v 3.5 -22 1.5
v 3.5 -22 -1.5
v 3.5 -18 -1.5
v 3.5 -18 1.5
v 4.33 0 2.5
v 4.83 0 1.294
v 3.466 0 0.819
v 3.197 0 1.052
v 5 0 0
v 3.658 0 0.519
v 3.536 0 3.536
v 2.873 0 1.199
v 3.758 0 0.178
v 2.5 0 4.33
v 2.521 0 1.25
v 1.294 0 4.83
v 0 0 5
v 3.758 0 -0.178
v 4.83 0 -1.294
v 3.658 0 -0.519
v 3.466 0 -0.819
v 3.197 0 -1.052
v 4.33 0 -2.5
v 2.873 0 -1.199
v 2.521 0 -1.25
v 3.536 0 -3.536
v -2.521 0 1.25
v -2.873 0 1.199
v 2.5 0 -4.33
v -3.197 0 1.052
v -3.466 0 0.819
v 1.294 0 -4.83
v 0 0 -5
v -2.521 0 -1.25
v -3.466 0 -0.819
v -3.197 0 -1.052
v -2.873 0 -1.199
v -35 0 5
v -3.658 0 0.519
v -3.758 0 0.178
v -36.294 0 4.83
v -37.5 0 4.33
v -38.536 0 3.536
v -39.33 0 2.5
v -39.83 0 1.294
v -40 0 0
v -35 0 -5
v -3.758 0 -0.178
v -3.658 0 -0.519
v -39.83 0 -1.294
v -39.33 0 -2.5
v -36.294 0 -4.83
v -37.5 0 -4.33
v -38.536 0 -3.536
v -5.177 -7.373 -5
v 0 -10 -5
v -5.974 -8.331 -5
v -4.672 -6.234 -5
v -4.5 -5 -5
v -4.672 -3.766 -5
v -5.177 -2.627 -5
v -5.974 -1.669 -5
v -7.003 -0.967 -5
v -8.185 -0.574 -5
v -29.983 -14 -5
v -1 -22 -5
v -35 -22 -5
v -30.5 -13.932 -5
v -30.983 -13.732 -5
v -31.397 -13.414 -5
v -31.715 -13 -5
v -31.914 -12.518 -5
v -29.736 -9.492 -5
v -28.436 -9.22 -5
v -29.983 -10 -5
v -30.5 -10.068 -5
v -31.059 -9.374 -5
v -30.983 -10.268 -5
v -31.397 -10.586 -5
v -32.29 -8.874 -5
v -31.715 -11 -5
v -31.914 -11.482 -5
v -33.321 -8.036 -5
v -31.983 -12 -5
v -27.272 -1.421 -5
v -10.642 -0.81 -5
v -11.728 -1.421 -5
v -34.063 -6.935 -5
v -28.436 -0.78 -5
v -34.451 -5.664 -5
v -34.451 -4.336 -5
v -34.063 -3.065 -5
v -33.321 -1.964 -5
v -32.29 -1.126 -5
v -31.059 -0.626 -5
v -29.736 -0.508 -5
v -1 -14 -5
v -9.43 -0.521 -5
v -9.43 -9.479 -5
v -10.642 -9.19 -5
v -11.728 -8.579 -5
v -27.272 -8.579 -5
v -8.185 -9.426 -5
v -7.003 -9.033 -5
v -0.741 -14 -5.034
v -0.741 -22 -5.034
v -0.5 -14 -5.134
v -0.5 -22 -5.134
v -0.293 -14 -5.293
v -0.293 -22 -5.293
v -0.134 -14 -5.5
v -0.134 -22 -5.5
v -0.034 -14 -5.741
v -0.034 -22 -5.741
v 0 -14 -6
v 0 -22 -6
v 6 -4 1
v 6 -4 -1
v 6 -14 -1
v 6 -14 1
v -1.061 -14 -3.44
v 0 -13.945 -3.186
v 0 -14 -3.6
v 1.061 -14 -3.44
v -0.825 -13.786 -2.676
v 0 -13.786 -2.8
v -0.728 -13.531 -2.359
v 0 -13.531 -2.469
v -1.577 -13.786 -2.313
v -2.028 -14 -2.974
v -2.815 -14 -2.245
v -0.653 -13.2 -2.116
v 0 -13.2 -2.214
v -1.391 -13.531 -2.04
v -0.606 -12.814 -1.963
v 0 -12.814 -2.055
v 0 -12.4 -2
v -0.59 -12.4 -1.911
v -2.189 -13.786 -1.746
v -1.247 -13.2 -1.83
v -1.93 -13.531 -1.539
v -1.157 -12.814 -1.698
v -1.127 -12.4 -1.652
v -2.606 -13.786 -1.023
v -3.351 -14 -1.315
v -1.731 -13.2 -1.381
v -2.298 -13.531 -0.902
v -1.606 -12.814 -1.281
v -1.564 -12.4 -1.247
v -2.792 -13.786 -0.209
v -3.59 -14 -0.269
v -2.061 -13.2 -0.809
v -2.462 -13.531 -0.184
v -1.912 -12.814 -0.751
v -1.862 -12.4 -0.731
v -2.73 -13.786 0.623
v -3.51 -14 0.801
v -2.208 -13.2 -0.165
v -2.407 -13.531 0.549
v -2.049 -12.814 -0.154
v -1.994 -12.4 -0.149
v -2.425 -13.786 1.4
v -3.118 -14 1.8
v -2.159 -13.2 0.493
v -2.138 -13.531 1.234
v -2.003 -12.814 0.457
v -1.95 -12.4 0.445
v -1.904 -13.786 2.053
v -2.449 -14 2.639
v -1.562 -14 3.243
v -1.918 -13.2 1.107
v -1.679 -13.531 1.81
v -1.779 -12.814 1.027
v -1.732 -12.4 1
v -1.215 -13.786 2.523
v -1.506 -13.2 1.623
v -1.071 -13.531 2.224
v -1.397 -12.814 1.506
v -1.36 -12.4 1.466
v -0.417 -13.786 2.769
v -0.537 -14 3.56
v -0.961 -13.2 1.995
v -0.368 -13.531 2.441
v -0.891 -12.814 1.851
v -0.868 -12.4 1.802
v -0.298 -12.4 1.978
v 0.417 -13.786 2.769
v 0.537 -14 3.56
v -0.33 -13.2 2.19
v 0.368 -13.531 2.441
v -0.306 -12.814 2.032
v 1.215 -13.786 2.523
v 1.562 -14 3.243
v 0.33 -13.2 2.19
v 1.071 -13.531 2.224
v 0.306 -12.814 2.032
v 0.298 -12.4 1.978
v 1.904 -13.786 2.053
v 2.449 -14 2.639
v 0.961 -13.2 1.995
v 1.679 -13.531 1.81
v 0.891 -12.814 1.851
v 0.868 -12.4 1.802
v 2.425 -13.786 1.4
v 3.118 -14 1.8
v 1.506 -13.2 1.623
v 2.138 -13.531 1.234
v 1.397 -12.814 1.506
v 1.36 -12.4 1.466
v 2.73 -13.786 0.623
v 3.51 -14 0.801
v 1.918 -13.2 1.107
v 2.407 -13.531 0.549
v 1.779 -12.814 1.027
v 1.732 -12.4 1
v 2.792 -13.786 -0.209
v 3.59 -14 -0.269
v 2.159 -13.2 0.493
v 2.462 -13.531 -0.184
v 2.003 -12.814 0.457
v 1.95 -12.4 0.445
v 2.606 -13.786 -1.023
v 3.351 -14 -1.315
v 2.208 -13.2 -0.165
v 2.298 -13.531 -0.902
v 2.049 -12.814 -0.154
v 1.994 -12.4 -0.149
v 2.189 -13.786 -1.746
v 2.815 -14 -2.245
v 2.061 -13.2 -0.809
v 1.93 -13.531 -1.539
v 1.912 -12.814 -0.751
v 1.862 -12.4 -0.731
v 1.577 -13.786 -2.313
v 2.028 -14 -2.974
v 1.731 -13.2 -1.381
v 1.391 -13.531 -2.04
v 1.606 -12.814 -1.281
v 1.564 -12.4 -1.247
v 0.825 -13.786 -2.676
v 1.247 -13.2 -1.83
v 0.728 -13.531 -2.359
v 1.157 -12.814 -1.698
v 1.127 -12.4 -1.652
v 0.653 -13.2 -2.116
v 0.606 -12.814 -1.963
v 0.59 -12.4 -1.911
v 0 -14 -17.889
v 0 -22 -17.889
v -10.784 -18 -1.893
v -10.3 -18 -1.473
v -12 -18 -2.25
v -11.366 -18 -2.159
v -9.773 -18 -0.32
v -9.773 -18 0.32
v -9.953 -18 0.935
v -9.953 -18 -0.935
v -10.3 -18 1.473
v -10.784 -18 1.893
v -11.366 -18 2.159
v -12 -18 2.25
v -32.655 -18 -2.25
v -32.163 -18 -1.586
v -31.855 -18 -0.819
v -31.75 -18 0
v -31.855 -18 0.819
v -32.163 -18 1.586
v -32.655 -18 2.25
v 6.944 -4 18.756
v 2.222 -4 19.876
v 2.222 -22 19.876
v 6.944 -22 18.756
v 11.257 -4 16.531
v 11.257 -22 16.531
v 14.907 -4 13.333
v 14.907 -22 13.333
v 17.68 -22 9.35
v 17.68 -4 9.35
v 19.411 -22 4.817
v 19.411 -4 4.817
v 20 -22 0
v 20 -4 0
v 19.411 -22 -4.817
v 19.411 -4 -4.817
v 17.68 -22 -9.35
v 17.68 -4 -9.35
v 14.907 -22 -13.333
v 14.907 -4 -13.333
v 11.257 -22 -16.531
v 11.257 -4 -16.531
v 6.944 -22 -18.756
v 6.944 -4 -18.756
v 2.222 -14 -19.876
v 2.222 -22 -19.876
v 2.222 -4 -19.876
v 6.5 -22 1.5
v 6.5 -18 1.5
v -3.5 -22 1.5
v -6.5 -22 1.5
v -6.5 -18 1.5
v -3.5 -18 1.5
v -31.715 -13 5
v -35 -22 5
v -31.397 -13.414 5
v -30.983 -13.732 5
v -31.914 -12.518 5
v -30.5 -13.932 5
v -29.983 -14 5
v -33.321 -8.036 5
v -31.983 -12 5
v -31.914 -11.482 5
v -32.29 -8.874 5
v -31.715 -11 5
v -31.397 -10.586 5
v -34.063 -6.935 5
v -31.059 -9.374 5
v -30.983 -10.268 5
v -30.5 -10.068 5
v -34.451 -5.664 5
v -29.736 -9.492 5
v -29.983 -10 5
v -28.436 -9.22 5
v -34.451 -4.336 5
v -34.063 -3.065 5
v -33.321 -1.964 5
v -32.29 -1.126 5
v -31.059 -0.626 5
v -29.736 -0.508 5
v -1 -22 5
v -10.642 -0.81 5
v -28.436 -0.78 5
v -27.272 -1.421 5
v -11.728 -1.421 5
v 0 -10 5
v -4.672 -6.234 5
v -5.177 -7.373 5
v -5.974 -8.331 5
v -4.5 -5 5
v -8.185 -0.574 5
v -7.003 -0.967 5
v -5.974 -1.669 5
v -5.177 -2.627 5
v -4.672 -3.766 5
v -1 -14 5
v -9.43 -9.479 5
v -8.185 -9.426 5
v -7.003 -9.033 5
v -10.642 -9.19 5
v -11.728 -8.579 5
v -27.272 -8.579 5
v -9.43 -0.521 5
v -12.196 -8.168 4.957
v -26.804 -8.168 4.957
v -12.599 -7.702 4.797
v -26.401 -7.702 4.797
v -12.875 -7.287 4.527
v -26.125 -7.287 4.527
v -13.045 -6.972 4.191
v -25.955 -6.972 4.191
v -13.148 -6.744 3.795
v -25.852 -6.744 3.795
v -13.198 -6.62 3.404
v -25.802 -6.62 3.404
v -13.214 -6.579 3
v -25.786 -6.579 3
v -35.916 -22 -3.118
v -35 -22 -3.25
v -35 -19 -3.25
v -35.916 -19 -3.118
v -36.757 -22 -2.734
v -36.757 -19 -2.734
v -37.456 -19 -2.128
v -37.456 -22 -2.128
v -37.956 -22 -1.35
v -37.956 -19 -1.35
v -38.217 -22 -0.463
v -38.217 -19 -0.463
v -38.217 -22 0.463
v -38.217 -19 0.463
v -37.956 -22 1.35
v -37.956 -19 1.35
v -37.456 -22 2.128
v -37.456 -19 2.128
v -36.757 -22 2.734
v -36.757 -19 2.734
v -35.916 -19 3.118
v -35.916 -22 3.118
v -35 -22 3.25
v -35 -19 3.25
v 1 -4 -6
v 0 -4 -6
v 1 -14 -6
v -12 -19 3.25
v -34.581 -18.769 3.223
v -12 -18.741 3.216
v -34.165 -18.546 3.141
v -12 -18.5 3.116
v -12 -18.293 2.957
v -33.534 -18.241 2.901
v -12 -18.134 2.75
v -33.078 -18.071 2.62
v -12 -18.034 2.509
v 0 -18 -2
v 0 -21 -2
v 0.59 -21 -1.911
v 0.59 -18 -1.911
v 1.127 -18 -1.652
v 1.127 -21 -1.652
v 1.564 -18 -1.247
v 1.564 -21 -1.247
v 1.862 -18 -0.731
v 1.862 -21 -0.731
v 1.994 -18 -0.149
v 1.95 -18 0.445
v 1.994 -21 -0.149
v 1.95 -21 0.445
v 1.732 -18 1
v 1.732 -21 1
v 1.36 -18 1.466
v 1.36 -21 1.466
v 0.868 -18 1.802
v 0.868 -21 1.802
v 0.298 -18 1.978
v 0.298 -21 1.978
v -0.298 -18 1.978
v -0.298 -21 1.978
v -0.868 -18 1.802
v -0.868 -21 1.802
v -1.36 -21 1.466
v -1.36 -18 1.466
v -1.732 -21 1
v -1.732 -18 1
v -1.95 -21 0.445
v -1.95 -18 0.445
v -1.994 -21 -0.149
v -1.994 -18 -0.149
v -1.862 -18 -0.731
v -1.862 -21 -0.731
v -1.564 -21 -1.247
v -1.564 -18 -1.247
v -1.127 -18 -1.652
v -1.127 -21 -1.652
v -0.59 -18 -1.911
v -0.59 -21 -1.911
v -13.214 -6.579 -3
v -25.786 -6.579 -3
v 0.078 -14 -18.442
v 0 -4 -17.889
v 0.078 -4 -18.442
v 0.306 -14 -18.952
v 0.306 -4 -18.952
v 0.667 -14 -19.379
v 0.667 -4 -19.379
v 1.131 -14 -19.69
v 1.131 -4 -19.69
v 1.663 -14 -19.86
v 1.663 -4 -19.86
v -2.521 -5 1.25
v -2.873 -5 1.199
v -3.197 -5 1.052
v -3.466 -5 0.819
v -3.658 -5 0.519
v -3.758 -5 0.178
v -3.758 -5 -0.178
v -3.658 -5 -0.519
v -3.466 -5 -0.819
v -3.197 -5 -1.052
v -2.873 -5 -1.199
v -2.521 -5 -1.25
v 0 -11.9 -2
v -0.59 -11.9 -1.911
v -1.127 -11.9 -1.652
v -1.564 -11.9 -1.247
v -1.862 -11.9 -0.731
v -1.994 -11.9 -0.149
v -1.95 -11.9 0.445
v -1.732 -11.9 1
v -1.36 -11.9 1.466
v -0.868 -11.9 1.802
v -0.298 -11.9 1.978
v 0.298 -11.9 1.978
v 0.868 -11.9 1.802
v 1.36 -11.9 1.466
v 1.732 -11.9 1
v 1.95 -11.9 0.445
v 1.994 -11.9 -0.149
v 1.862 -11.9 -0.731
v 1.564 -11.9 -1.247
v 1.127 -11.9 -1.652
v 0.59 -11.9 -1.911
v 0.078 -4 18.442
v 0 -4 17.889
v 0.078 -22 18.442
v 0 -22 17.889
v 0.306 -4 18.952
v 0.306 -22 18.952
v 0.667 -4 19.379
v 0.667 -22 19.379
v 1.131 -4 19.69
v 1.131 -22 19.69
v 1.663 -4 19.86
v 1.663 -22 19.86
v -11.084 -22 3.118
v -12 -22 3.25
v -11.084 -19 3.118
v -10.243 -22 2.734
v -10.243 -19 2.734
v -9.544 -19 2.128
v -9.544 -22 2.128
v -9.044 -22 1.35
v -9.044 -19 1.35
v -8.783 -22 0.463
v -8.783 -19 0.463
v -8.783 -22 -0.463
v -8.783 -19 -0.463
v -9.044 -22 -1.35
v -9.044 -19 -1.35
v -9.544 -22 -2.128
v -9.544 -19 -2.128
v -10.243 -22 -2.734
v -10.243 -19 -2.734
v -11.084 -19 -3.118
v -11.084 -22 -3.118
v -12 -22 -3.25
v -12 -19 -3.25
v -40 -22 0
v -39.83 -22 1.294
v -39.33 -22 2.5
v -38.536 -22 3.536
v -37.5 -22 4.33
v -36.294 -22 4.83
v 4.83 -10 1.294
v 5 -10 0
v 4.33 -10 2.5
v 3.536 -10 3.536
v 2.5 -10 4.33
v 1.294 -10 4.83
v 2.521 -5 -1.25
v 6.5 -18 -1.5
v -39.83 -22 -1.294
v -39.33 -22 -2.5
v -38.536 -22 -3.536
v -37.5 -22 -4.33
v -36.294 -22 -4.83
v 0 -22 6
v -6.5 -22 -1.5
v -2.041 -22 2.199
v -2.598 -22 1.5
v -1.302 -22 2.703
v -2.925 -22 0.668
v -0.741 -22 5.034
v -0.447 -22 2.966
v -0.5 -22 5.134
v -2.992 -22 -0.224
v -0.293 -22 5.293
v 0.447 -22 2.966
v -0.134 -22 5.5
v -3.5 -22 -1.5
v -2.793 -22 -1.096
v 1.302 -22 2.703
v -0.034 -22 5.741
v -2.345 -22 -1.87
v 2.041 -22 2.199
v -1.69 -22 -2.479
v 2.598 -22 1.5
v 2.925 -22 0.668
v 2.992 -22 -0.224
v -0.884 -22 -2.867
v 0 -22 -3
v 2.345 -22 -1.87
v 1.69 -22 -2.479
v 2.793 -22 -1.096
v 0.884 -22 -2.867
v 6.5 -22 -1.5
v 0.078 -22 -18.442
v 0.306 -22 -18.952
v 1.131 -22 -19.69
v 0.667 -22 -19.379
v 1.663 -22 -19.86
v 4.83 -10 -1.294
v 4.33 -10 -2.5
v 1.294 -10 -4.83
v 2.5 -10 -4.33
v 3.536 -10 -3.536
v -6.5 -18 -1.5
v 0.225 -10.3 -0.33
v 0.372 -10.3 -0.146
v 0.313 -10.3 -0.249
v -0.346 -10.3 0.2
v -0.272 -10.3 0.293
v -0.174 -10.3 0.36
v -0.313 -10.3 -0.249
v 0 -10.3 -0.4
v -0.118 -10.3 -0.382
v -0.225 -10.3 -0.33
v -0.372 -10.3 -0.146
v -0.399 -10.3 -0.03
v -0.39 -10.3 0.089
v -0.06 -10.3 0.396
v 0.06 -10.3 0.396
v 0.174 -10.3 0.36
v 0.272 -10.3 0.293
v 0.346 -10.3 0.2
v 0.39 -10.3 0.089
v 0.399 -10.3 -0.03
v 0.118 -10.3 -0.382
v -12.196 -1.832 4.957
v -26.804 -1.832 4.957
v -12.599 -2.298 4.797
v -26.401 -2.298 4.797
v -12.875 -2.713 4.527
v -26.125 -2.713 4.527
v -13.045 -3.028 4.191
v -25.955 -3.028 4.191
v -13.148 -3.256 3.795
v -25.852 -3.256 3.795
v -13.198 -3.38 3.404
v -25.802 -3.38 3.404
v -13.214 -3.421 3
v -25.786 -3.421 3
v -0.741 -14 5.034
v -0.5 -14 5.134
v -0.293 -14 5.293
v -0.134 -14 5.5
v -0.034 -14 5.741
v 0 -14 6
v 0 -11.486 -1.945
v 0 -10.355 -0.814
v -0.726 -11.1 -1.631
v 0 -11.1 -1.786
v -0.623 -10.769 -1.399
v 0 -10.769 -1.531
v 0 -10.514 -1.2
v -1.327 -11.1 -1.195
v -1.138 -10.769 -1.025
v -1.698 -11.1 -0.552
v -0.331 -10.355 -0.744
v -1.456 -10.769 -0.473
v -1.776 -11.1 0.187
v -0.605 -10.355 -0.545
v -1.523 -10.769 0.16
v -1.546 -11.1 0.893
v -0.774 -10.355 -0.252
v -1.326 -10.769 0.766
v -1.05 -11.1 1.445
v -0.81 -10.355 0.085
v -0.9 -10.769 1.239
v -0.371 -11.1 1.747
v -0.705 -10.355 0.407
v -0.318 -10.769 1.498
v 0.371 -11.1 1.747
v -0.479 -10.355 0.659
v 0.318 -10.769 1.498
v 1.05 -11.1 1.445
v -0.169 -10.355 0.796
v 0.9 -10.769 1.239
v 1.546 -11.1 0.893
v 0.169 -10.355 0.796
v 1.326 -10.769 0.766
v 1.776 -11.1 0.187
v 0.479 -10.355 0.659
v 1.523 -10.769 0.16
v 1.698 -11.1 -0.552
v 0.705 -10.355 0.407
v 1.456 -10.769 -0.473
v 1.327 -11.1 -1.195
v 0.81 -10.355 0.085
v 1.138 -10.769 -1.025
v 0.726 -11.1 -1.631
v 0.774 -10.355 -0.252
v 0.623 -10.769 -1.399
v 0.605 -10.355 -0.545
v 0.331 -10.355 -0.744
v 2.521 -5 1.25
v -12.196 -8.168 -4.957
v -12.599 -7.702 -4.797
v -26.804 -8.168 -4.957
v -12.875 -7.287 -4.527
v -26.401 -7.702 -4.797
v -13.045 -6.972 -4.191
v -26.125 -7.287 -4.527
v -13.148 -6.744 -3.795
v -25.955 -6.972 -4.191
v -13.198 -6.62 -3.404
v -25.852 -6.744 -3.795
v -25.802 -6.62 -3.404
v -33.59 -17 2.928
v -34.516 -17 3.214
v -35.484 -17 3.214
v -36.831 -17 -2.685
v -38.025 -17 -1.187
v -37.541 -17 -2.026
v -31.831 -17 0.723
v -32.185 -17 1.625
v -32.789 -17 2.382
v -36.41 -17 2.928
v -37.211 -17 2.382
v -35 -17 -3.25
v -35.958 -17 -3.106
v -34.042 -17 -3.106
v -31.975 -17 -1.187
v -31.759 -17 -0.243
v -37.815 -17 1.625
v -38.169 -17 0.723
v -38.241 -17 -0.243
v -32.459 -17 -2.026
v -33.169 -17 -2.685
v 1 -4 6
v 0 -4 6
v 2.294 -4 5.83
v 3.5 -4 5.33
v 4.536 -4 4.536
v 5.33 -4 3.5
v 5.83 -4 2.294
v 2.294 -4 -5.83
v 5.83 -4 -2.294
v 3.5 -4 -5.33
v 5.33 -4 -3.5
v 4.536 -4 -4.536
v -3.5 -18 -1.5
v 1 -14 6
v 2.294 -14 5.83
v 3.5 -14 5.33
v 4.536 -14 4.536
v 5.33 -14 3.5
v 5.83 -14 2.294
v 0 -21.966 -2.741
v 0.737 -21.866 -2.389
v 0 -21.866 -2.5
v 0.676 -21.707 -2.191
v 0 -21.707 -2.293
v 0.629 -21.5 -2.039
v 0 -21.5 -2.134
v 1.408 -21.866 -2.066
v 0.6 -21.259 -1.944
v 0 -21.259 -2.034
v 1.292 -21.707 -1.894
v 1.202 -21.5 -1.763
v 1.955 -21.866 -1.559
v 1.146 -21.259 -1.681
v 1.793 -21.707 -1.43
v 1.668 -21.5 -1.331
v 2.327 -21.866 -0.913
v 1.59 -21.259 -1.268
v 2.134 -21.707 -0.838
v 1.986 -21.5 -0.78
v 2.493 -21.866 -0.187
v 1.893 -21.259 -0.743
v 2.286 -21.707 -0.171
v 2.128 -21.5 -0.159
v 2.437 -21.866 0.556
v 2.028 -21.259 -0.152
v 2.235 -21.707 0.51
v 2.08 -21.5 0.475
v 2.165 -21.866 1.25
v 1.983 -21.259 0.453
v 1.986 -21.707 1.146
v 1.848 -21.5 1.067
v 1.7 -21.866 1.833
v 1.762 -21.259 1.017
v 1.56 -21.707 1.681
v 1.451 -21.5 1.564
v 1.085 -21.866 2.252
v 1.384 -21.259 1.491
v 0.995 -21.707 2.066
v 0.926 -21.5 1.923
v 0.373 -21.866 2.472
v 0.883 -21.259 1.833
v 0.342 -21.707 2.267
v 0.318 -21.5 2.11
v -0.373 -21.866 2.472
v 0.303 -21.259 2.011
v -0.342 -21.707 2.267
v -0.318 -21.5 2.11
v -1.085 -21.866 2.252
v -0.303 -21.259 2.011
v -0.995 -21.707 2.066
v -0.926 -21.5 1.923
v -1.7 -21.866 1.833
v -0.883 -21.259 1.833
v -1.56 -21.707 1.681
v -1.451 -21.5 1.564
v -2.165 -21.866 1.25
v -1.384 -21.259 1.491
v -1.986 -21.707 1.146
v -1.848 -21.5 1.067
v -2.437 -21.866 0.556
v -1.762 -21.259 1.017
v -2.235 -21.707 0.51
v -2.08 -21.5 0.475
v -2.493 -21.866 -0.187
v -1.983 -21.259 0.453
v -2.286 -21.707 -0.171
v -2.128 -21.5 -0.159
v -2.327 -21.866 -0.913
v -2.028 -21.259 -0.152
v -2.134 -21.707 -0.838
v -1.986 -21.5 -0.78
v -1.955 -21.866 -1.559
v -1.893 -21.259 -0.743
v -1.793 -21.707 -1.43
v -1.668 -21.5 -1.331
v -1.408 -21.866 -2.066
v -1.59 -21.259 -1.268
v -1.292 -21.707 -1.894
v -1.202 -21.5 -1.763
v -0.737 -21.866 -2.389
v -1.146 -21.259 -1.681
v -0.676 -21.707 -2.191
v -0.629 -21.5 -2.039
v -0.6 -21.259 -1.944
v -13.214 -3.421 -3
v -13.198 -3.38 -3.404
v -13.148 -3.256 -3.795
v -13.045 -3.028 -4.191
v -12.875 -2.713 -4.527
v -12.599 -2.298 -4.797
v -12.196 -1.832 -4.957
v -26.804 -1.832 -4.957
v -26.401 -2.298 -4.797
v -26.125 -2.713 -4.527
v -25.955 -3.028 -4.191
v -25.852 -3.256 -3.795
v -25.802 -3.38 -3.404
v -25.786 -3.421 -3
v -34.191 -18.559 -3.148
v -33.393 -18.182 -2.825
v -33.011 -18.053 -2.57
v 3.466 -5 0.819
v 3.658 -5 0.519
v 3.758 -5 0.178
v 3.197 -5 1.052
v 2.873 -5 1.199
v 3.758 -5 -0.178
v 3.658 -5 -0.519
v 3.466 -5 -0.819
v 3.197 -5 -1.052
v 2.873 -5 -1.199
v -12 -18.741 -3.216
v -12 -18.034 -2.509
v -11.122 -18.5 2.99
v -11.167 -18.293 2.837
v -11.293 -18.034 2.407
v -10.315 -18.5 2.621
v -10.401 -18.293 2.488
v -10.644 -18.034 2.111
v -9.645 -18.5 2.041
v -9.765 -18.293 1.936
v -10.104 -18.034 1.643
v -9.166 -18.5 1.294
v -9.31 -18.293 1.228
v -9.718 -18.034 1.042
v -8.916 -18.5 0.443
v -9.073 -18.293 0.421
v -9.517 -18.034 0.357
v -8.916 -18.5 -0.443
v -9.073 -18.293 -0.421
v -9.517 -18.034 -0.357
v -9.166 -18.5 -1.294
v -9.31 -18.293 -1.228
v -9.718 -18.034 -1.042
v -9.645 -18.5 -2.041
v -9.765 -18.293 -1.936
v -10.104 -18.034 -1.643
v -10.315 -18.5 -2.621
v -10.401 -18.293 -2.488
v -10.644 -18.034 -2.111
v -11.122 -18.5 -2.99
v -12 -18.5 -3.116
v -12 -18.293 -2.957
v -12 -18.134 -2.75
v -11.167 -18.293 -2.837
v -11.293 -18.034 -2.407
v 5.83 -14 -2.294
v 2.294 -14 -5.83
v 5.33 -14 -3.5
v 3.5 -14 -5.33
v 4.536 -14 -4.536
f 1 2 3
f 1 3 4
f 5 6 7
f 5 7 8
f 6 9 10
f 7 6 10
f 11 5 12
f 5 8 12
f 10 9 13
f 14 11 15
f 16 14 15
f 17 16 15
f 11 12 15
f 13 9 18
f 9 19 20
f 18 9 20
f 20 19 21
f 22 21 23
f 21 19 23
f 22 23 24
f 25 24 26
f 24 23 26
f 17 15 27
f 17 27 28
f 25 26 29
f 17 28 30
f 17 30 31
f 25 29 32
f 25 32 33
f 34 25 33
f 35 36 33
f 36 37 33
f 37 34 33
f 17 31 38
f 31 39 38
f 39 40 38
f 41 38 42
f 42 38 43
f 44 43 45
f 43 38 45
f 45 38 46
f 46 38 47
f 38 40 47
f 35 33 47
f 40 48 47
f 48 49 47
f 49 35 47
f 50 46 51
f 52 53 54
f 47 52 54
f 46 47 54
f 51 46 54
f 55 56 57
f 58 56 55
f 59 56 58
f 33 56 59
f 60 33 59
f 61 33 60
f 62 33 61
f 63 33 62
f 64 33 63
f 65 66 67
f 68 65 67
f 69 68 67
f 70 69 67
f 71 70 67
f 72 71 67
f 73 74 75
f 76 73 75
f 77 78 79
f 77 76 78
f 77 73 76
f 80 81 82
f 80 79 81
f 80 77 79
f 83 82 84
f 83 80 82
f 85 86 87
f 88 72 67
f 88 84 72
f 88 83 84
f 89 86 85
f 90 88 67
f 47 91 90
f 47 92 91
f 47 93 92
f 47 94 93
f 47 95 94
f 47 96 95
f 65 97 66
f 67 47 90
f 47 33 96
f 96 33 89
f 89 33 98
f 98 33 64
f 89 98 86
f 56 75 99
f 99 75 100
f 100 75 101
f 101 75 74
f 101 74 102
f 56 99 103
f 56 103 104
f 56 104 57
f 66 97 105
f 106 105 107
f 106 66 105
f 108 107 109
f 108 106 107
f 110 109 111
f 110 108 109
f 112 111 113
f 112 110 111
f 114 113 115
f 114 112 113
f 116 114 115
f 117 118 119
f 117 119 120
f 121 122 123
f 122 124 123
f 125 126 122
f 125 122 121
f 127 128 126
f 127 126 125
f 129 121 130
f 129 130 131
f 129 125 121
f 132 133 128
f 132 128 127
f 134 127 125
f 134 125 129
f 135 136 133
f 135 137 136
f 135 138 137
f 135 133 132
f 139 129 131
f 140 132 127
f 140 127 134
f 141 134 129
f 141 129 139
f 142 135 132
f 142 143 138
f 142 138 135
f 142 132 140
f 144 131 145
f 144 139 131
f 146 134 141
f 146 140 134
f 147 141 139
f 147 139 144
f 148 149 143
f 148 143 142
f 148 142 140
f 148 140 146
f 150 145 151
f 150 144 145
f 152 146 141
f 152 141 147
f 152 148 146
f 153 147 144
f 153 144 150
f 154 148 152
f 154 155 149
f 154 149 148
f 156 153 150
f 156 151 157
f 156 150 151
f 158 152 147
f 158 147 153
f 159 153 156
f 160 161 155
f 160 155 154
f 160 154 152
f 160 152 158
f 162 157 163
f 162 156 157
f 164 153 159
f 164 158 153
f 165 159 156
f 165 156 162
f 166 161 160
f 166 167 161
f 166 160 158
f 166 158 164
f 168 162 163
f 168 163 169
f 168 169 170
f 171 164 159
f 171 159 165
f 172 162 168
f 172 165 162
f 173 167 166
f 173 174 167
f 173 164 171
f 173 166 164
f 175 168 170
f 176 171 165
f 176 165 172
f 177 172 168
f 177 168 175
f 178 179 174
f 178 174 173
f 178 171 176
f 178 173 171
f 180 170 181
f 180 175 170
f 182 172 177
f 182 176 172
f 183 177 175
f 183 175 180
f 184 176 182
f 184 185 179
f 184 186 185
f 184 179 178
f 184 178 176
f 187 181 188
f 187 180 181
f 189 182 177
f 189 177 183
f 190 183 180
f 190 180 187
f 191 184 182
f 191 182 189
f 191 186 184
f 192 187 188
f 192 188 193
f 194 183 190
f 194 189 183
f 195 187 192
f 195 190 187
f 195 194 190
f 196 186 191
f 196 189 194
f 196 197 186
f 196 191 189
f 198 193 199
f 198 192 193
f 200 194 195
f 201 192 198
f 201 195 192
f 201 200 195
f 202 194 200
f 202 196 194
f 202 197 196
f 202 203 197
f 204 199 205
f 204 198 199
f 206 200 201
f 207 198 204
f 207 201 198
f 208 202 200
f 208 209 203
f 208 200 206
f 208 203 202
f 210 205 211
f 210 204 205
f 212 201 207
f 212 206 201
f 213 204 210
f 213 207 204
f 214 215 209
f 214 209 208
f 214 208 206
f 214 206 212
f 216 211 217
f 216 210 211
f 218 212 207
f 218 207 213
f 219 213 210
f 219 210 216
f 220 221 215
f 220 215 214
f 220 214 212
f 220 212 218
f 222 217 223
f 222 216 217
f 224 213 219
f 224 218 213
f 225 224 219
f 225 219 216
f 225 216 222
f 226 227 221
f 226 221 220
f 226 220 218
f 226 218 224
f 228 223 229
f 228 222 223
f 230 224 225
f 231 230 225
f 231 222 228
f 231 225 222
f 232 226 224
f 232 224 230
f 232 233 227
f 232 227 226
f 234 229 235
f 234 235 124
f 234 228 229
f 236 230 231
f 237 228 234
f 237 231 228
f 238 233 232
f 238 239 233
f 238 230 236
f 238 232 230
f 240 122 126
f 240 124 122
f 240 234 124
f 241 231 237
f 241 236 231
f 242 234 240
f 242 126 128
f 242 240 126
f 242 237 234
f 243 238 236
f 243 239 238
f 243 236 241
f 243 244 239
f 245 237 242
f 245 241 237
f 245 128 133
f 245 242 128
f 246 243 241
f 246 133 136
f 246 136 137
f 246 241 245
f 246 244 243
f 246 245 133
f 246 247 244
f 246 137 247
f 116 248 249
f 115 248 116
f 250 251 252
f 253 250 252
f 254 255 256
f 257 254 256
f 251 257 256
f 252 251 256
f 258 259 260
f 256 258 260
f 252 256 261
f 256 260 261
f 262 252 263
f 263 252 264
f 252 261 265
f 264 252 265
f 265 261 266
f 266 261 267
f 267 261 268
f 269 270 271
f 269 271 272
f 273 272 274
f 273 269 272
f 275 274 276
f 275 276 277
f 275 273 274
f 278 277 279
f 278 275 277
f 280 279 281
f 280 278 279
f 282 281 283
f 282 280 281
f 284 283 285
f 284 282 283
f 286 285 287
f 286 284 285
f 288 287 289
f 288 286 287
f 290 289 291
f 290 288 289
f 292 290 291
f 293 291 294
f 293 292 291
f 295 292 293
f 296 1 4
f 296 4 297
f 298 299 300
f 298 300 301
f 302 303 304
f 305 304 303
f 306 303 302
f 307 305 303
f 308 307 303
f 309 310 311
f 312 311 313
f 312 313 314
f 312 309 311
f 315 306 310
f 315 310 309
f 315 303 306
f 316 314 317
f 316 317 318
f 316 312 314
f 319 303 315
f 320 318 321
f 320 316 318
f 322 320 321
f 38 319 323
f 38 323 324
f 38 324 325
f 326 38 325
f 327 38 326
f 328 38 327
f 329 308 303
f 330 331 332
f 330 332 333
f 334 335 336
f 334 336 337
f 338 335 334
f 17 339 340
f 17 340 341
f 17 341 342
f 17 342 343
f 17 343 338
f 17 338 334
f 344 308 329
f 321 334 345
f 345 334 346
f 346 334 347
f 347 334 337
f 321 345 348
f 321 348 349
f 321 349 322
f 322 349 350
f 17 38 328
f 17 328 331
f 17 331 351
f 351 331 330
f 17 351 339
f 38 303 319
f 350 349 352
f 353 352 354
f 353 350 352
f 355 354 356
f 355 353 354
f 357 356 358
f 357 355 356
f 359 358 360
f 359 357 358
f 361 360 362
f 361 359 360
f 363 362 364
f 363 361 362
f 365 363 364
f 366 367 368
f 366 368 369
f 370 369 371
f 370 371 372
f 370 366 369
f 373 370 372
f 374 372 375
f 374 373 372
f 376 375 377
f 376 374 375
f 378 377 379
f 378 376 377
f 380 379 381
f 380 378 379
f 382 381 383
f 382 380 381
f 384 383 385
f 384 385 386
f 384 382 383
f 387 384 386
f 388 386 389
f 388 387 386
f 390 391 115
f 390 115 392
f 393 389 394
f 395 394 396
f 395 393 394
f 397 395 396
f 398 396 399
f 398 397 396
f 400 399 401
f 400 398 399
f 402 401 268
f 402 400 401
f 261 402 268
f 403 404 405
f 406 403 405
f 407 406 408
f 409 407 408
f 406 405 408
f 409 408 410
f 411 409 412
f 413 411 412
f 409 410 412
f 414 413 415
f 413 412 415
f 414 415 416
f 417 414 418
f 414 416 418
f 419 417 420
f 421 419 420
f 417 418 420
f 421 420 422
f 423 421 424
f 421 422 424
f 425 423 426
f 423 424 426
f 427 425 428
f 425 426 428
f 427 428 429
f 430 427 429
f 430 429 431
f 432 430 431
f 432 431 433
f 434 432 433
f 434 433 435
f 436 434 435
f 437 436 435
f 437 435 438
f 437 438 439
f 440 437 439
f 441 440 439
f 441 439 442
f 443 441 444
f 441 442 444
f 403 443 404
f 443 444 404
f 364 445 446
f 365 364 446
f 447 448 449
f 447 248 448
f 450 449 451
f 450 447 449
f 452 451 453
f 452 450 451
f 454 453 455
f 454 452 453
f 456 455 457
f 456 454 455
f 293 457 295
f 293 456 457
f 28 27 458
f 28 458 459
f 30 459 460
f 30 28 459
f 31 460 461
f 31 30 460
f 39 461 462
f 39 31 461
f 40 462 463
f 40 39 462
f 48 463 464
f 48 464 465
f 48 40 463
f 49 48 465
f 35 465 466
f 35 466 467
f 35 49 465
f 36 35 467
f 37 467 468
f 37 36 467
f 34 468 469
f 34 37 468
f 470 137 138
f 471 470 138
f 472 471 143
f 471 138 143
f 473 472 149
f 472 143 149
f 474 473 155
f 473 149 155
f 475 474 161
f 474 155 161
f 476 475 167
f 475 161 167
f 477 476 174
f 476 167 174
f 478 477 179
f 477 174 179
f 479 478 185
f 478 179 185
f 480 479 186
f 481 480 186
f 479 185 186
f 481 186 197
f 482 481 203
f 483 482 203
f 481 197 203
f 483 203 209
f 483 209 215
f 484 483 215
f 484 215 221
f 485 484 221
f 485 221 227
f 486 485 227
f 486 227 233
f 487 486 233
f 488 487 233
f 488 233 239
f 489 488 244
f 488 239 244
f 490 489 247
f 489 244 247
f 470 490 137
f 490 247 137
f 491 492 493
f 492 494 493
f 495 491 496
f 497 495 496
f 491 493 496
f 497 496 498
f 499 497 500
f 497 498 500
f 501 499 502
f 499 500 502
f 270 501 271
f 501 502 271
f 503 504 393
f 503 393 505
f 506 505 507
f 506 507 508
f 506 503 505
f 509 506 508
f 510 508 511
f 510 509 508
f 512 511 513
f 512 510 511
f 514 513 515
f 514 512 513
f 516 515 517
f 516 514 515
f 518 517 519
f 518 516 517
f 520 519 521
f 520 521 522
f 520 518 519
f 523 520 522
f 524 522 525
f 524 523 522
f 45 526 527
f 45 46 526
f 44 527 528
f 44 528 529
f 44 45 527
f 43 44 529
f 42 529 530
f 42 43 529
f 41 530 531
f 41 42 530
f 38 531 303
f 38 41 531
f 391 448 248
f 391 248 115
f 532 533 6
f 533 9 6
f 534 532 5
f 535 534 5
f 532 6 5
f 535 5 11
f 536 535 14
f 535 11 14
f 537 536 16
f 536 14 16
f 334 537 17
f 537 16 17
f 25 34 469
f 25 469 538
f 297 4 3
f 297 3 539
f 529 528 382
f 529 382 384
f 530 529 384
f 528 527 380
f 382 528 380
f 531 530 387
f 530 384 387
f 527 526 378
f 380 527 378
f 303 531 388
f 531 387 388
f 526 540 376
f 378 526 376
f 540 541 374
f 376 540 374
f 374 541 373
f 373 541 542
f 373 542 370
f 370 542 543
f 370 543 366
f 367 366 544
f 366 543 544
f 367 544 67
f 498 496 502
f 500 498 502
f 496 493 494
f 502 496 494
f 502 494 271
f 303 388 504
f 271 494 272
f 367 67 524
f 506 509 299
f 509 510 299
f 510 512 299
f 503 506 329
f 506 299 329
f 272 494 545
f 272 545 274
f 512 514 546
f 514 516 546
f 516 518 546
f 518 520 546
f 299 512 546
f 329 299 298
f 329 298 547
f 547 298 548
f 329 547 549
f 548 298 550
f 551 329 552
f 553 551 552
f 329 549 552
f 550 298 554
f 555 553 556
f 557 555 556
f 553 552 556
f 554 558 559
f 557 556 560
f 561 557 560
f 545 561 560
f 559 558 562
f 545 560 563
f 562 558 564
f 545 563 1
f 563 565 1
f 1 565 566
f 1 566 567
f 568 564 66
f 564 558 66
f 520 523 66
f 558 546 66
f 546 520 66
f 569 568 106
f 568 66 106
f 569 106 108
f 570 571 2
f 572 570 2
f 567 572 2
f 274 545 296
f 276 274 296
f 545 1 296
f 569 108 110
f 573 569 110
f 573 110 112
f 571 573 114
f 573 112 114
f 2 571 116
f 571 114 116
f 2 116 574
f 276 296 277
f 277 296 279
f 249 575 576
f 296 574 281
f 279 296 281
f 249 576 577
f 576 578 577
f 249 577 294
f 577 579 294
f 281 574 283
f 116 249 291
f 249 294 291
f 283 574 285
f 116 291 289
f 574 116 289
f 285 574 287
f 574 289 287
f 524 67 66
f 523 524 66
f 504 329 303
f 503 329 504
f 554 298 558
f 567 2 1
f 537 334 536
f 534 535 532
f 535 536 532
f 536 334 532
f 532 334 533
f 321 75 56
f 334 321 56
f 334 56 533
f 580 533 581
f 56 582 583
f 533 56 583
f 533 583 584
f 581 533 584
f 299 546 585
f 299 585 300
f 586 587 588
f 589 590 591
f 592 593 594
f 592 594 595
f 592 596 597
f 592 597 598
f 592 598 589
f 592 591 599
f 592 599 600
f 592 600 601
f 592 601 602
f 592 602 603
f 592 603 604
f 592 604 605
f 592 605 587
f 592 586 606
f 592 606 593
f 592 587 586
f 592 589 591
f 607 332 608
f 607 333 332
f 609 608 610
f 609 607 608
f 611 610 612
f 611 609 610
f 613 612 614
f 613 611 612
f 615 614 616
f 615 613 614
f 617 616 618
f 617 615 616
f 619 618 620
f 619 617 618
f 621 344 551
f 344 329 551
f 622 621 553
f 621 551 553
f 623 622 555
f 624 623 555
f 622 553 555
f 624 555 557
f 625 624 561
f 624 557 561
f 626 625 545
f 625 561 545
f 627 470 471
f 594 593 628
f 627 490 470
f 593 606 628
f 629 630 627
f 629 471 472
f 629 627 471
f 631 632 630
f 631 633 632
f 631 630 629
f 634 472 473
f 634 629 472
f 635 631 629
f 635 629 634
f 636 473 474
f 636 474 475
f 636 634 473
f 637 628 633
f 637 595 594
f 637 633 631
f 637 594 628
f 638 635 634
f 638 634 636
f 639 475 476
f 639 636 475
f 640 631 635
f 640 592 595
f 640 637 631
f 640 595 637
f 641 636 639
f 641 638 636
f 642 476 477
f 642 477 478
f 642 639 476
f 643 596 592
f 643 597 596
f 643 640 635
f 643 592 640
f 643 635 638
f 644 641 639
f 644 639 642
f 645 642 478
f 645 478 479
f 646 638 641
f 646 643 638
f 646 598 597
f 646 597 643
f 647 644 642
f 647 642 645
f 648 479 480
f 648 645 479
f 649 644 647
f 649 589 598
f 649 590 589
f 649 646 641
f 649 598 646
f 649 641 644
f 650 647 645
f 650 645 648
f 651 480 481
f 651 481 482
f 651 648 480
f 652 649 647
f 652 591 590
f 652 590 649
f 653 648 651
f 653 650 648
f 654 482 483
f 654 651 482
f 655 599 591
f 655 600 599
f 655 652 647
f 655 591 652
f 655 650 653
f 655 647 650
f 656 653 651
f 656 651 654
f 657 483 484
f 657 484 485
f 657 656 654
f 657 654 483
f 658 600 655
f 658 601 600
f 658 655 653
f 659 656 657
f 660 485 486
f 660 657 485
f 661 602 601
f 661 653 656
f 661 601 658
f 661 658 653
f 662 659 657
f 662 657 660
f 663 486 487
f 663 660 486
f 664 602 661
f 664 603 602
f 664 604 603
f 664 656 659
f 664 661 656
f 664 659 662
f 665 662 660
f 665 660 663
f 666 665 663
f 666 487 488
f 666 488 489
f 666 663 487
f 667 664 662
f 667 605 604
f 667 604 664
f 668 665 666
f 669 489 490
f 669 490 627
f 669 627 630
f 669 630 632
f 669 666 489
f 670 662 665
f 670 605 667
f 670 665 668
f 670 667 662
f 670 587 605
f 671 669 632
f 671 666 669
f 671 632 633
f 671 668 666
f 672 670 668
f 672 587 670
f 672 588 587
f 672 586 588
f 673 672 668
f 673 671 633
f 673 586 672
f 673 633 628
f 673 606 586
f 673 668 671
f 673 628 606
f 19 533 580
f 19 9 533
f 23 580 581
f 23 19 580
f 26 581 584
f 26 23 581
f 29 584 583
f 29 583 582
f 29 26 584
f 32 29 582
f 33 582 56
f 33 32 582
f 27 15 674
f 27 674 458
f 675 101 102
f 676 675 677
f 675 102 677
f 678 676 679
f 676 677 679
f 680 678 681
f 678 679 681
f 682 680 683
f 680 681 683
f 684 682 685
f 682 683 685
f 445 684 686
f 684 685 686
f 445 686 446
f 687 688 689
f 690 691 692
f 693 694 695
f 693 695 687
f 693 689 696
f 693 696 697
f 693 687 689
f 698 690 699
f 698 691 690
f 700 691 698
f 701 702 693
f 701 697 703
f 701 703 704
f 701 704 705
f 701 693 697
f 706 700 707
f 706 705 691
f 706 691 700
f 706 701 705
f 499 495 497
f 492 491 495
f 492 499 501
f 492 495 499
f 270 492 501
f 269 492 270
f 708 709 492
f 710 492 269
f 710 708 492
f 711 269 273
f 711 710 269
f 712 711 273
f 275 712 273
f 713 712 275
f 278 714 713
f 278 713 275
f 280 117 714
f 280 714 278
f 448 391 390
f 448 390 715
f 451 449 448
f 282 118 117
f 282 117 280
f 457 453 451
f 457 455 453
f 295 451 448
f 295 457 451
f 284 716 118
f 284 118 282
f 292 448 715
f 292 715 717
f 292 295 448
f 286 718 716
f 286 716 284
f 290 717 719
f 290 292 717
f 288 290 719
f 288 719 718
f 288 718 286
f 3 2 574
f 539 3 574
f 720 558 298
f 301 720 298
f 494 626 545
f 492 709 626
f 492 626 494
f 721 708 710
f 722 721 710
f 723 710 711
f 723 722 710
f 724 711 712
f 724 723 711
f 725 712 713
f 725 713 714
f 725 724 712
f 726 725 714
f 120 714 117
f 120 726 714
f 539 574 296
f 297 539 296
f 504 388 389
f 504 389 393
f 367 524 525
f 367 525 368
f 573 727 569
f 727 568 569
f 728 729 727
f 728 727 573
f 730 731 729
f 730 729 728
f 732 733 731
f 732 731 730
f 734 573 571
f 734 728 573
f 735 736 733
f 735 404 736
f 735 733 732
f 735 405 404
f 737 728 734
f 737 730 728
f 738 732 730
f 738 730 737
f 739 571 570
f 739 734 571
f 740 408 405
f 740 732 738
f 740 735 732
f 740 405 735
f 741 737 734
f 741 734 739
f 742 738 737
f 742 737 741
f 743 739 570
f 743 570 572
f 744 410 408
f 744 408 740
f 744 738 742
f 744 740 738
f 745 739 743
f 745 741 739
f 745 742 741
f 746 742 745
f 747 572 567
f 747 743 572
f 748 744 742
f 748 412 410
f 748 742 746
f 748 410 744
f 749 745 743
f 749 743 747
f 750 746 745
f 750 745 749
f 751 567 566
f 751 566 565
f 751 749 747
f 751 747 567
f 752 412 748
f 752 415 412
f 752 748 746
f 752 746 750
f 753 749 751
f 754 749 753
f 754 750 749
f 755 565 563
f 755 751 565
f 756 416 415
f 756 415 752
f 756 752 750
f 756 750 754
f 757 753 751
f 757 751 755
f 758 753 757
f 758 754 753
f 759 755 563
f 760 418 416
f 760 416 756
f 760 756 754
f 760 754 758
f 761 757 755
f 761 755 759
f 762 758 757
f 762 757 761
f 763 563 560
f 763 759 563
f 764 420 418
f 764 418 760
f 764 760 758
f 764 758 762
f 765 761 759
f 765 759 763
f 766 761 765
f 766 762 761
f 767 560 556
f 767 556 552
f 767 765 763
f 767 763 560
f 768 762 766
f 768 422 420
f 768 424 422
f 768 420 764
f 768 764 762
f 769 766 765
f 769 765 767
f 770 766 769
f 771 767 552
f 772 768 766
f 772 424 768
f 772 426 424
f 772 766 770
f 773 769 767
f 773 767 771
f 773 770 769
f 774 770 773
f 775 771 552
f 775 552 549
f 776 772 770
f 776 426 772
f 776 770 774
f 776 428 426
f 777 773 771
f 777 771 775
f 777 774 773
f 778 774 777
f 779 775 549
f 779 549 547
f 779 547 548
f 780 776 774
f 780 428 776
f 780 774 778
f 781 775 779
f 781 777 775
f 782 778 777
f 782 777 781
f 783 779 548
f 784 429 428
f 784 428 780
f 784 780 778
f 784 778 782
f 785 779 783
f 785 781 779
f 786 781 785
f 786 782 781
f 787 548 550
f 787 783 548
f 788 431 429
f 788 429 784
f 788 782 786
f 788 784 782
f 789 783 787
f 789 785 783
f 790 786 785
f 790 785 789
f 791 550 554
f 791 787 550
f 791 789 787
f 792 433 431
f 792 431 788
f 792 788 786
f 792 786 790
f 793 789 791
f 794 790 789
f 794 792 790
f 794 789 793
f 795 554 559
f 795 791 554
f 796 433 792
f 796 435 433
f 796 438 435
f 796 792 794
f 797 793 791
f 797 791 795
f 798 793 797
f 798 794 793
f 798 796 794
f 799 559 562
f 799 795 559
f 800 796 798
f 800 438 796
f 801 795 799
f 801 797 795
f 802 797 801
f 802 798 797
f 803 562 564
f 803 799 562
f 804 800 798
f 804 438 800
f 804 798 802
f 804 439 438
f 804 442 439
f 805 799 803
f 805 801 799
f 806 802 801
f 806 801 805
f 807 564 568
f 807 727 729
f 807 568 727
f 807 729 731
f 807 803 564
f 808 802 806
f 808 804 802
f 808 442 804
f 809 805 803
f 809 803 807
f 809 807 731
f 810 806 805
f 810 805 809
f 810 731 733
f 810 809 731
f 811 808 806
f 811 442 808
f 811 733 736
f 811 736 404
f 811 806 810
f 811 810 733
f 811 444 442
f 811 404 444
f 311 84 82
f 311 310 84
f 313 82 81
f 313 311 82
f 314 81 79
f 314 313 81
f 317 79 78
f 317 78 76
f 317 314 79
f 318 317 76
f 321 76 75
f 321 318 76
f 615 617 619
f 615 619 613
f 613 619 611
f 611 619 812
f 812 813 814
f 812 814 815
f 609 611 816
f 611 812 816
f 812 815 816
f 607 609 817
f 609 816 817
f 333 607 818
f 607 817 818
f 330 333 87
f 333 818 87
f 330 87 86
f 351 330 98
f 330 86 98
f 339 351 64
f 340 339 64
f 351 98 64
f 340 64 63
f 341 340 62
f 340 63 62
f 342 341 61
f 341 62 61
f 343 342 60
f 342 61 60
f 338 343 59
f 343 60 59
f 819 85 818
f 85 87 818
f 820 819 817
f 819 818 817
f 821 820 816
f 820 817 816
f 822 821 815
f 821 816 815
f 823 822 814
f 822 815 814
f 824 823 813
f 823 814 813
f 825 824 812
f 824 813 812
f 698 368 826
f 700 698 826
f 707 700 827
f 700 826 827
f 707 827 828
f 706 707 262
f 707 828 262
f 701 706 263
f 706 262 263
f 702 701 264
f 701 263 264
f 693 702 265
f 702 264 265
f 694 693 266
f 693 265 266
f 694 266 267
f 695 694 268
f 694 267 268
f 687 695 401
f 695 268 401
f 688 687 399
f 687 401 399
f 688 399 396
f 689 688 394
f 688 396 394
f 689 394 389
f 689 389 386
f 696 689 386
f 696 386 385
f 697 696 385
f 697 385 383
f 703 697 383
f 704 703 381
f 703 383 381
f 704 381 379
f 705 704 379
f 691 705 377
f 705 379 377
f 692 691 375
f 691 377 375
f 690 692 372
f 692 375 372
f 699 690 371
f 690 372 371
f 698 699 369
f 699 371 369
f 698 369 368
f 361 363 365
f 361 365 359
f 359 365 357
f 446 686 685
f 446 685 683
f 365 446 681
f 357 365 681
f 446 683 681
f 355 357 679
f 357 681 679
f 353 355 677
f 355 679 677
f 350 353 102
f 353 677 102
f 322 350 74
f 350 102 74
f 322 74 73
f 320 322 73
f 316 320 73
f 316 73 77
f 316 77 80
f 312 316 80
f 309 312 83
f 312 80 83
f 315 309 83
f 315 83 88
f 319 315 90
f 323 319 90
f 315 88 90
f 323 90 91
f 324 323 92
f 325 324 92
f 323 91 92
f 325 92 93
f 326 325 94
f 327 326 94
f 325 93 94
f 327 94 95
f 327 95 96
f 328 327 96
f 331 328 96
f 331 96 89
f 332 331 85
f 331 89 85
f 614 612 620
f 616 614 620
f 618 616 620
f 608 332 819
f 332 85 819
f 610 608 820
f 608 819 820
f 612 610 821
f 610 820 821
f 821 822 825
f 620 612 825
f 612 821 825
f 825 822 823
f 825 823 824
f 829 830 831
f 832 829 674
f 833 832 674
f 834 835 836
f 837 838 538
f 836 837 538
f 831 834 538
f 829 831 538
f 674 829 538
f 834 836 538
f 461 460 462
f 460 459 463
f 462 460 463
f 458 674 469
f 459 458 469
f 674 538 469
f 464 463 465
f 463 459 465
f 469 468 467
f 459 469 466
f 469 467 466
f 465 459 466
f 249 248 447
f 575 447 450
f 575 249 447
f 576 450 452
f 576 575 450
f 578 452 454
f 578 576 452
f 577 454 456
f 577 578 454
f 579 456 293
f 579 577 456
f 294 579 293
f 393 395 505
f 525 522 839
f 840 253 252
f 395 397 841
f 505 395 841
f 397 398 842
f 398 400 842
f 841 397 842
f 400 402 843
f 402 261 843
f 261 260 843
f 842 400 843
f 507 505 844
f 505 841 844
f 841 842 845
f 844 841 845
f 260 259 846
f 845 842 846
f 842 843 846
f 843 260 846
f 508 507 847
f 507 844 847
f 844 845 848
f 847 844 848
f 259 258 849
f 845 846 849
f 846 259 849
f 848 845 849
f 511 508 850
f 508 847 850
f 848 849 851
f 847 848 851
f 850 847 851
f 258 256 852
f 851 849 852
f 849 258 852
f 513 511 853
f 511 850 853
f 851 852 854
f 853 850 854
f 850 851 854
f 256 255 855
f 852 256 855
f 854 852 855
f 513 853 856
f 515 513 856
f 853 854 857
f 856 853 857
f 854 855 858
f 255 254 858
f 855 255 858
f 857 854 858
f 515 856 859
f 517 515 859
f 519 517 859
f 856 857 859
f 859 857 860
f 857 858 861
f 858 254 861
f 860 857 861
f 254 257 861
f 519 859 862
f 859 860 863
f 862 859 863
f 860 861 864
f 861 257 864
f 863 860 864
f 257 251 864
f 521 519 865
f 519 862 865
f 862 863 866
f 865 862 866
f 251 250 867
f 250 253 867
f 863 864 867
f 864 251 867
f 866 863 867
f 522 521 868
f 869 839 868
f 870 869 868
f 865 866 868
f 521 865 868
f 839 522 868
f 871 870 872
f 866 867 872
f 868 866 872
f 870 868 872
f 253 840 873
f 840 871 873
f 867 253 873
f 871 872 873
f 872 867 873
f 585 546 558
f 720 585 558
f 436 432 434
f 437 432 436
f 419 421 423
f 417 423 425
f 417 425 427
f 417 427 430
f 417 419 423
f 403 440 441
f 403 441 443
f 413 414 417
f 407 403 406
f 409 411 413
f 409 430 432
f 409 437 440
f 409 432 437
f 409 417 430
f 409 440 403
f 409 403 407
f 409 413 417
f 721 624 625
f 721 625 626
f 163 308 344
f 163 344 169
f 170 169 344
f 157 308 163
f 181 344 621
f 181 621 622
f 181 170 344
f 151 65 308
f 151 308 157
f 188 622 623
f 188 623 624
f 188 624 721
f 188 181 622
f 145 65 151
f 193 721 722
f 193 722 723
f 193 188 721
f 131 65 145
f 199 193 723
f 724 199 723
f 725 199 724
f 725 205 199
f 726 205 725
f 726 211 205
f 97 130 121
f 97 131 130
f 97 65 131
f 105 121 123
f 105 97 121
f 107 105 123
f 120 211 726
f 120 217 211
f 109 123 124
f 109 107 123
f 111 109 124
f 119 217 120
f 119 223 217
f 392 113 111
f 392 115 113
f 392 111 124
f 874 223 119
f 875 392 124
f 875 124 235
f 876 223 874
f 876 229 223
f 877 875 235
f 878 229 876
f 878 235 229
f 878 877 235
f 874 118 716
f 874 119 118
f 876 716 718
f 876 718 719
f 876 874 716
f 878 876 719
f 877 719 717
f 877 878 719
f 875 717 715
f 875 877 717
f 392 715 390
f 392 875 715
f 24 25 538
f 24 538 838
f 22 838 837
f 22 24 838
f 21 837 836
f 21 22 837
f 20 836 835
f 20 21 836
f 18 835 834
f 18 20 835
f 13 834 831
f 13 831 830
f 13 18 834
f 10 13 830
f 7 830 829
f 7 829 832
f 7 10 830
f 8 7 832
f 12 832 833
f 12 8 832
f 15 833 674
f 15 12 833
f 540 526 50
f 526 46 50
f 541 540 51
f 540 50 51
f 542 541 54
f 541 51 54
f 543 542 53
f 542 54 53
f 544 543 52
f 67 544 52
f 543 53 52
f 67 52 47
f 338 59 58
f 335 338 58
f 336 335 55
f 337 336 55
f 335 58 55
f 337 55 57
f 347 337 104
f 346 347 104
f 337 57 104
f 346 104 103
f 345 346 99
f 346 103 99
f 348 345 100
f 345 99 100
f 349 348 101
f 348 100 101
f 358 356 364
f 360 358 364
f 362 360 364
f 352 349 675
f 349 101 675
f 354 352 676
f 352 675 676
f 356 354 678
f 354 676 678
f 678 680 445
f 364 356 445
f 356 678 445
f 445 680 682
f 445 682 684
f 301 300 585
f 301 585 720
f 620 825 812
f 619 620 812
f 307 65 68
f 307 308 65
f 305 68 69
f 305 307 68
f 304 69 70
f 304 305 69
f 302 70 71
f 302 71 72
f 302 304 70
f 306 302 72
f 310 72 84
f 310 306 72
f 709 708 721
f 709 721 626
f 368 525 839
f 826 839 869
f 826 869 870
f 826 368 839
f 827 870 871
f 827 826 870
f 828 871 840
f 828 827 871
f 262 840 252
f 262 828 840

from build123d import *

# Parameters (mm, degrees)
BOSS_EXTRUDE1_DEPTH      = 5
BOSS_EXTRUDE1_DEPTH_BACK = 5
CUT_EXTRUDE1_DEPTH       = 5
BOSS_EXTRUDE2_START      = -14
SKETCH3_W                = 5.881583951
SKETCH3_H                = 10
BOSS_EXTRUDE2_DEPTH      = 8
BOSS_EXTRUDE3_START      = 10
BOSS_EXTRUDE3_DEPTH      = 10
FILLET2_R                = 5
FILLET3_R                = 2
SKETCH5_R                = 2
SKETCH5_W                = 3
SKETCH5_H                = 3
CUT_EXTRUDE2_DEPTH       = 4
FILLET4_R                = 1
SKETCH6_R                = 3.25
CUT_EXTRUDE3_DEPTH       = 5
BOSS_EXTRUDE4_START      = -14
SKETCH7_R                = 2
BOSS_EXTRUDE4_DEPTH      = 3.7
FILLET5_R                = 1.6


with BuildPart() as part:
    # Sketch1 → Boss-Extrude1 (new, two sides: drawn at the far end of the back side and taken through both)
    with BuildSketch(Plane.XY.offset(-BOSS_EXTRUDE1_DEPTH_BACK)):
        Polygon((5, -10), (5, 0), (0, 0), (-5, 0), (-35, 0), (-40, 0), (-40, -14), (-31.982625312, -14), (-31.982625312, -10), (-5, -10), align=None)
        with BuildLine():
            ThreePointArc((-25.78623506, -6.579298906), (-34.5, -5), (-25.78623506, -3.420701094))
            Line((-25.78623506, -3.420701094), (-13.21376494, -3.420701094))
            ThreePointArc((-13.21376494, -3.420701094), (-8.197485897, -0.572136959), (-4.5, -5))
            ThreePointArc((-4.5, -5), (-8.197485897, -9.427863041), (-13.21376494, -6.579298906))
            Line((-13.21376494, -6.579298906), (-25.78623506, -6.579298906))
        make_face(mode=Mode.SUBTRACT)
    extrude(amount=BOSS_EXTRUDE1_DEPTH + BOSS_EXTRUDE1_DEPTH_BACK)

    # Sketch2 → Cut-Extrude1 (cut)
    with BuildSketch(Plane(origin=(0, 0, 0), x_dir=(1, 0, 0), z_dir=(0, 1, 0))):
        with BuildLine():
            Line((-2.520975228, 1.25), (2.520975228, 1.25))
            ThreePointArc((2.520975228, 1.25), (3.770975228, 0), (2.520975228, -1.25))
            Line((2.520975228, -1.25), (-2.520975228, -1.25))
            ThreePointArc((-2.520975228, -1.25), (-3.770975228, 0), (-2.520975228, 1.25))
        make_face()
    extrude(amount=-CUT_EXTRUDE1_DEPTH, mode=Mode.SUBTRACT)

    # Sketch3 → Boss-Extrude2 (add)
    with BuildSketch(Plane(origin=(0, 0, 0), x_dir=(1, 0, 0), z_dir=(0, 1, 0)).offset(BOSS_EXTRUDE2_START)):
        with BuildLine():
            Line((0, 20), (0, 5))
            Line((0, 5), (5.881583951, 5))
            Line((5.881583951, 5), (5.881583951, -5))
            Line((5.881583951, -5), (0, -5))
            Line((0, -5), (0, -20))
            ThreePointArc((0, -20), (14.142135624, -14.142135624), (20, 0))
            ThreePointArc((20, 0), (14.142135624, 14.142135624), (0, 20))
        make_face()
        with Locations((2.940791976, 0)):
            Rectangle(SKETCH3_W, SKETCH3_H)
        with BuildLine():
            Line((0, 5), (-19.364916731, 5))
            ThreePointArc((-19.364916731, 5), (-20, 0), (-19.364916731, -5))
            Line((-19.364916731, -5), (0, -5))
            Line((0, -5), (0, 5))
        make_face()
        with BuildLine():
            Line((-19.364916731, 5), (-40, 5))
            Line((-40, 5), (-40, -5))
            Line((-40, -5), (-19.364916731, -5))
            ThreePointArc((-19.364916731, -5), (-20, 0), (-19.364916731, 5))
        make_face()
    extrude(amount=-BOSS_EXTRUDE2_DEPTH)

    # Sketch4 → Boss-Extrude3 (add)
    with BuildSketch(Plane(origin=(0, -14, 0), x_dir=(1, 0, 0), z_dir=(0, 1, 0)).offset(BOSS_EXTRUDE3_START)):
        with BuildLine():
            ThreePointArc((20, 0), (14.142135624, 14.142135624), (0, 20))
            Line((0, 20), (0, 6))
            Line((0, 6), (6, 6))
            Line((6, 6), (6, -6))
            Line((6, -6), (0, -6))
            Line((0, -6), (0, -20))
            ThreePointArc((0, -20), (14.142135624, -14.142135624), (20, 0))
        make_face()
    extrude(amount=-BOSS_EXTRUDE3_DEPTH)

    # Fillet2
    fillet2_edges = [part.edges().sort_by_distance(p)[0] for p in [
        (-40, -11, -5),
        (-40, -11, 5),
        (6, -9, 6),
        (6, -9, -6),
        (5, -5, 5),
        (5, -5, -5),
    ]]
    fillet(fillet2_edges, radius=FILLET2_R - 0.0001)  # a hair under: the kernel refuses the full size

    # Fillet3
    fillet3_edges = [part.edges().sort_by_distance(p)[0] for p in [
        (-19.5, -3.420701094, 5),
        (-19.5, -3.420701094, -5),
        (-19.5, -6.579298906, 5),
        (-19.5, -6.579298906, -5),
        (-31.982625312, -10, 0),
        (-31.982625312, -14, 0),
        (0, -13, -20),
        (0, -13, 20),
    ]]
    fillet(fillet3_edges, radius=FILLET3_R - 0.0001)  # a hair under: the kernel refuses the full size

    # Sketch5 → Cut-Extrude2 (cut)
    with BuildSketch(Plane.XZ.offset(22)):
        with Locations(Location((0, 0, 0), (0, 0, 270))):
            Circle(SKETCH5_R)
        with BuildLine():
            Line((-35, 3.25), (-12, 3.25))
            ThreePointArc((-12, 3.25), (-8.75, 0), (-12, -3.25))
            Line((-12, -3.25), (-35, -3.25))
            ThreePointArc((-35, -3.25), (-38.25, 0), (-35, 3.25))
        make_face()
        with Locations((-5, 0)):
            Rectangle(SKETCH5_W, SKETCH5_H)
        with Locations((5, 0)):
            Rectangle(SKETCH5_W, SKETCH5_H)
    extrude(amount=-CUT_EXTRUDE2_DEPTH, mode=Mode.SUBTRACT)

    # Fillet4
    fillet4_edges = [part.edges().sort_by_distance(p)[0] for p in [
        (-23.5, -18, 3.25),
        (-8.75, -18, 0),
        (-23.5, -18, -3.25),
        (-38.25, -18, 0),
        (0, -18, -5),
        (0, -18, 5),
        (0, -22, 2),
    ]]
    fillet(fillet4_edges, radius=FILLET4_R)

    # Sketch6 → Cut-Extrude3 (cut)
    with BuildSketch(Plane.XZ.offset(22)):
        with Locations(Location((-35, 0, 0), (0, 0, 270))):
            Circle(SKETCH6_R)
    extrude(amount=-CUT_EXTRUDE3_DEPTH, mode=Mode.SUBTRACT)

    # Sketch7 → Boss-Extrude4 (add)
    with BuildSketch(Plane(origin=(0, 0, 0), x_dir=(1, 0, 0), z_dir=(0, 1, 0)).offset(BOSS_EXTRUDE4_START)):
        with Locations(Location((0, 0, 0), (0, 0, 90))):
            Circle(SKETCH7_R)
    extrude(amount=BOSS_EXTRUDE4_DEPTH)

    # Fillet5
    fillet5_edges = [part.edges().sort_by_distance(p)[0] for p in [
        (0, -14, 2),
        (0, -10.3, 2),
    ]]
    fillet(fillet5_edges, radius=FILLET5_R)


solid = part.part
